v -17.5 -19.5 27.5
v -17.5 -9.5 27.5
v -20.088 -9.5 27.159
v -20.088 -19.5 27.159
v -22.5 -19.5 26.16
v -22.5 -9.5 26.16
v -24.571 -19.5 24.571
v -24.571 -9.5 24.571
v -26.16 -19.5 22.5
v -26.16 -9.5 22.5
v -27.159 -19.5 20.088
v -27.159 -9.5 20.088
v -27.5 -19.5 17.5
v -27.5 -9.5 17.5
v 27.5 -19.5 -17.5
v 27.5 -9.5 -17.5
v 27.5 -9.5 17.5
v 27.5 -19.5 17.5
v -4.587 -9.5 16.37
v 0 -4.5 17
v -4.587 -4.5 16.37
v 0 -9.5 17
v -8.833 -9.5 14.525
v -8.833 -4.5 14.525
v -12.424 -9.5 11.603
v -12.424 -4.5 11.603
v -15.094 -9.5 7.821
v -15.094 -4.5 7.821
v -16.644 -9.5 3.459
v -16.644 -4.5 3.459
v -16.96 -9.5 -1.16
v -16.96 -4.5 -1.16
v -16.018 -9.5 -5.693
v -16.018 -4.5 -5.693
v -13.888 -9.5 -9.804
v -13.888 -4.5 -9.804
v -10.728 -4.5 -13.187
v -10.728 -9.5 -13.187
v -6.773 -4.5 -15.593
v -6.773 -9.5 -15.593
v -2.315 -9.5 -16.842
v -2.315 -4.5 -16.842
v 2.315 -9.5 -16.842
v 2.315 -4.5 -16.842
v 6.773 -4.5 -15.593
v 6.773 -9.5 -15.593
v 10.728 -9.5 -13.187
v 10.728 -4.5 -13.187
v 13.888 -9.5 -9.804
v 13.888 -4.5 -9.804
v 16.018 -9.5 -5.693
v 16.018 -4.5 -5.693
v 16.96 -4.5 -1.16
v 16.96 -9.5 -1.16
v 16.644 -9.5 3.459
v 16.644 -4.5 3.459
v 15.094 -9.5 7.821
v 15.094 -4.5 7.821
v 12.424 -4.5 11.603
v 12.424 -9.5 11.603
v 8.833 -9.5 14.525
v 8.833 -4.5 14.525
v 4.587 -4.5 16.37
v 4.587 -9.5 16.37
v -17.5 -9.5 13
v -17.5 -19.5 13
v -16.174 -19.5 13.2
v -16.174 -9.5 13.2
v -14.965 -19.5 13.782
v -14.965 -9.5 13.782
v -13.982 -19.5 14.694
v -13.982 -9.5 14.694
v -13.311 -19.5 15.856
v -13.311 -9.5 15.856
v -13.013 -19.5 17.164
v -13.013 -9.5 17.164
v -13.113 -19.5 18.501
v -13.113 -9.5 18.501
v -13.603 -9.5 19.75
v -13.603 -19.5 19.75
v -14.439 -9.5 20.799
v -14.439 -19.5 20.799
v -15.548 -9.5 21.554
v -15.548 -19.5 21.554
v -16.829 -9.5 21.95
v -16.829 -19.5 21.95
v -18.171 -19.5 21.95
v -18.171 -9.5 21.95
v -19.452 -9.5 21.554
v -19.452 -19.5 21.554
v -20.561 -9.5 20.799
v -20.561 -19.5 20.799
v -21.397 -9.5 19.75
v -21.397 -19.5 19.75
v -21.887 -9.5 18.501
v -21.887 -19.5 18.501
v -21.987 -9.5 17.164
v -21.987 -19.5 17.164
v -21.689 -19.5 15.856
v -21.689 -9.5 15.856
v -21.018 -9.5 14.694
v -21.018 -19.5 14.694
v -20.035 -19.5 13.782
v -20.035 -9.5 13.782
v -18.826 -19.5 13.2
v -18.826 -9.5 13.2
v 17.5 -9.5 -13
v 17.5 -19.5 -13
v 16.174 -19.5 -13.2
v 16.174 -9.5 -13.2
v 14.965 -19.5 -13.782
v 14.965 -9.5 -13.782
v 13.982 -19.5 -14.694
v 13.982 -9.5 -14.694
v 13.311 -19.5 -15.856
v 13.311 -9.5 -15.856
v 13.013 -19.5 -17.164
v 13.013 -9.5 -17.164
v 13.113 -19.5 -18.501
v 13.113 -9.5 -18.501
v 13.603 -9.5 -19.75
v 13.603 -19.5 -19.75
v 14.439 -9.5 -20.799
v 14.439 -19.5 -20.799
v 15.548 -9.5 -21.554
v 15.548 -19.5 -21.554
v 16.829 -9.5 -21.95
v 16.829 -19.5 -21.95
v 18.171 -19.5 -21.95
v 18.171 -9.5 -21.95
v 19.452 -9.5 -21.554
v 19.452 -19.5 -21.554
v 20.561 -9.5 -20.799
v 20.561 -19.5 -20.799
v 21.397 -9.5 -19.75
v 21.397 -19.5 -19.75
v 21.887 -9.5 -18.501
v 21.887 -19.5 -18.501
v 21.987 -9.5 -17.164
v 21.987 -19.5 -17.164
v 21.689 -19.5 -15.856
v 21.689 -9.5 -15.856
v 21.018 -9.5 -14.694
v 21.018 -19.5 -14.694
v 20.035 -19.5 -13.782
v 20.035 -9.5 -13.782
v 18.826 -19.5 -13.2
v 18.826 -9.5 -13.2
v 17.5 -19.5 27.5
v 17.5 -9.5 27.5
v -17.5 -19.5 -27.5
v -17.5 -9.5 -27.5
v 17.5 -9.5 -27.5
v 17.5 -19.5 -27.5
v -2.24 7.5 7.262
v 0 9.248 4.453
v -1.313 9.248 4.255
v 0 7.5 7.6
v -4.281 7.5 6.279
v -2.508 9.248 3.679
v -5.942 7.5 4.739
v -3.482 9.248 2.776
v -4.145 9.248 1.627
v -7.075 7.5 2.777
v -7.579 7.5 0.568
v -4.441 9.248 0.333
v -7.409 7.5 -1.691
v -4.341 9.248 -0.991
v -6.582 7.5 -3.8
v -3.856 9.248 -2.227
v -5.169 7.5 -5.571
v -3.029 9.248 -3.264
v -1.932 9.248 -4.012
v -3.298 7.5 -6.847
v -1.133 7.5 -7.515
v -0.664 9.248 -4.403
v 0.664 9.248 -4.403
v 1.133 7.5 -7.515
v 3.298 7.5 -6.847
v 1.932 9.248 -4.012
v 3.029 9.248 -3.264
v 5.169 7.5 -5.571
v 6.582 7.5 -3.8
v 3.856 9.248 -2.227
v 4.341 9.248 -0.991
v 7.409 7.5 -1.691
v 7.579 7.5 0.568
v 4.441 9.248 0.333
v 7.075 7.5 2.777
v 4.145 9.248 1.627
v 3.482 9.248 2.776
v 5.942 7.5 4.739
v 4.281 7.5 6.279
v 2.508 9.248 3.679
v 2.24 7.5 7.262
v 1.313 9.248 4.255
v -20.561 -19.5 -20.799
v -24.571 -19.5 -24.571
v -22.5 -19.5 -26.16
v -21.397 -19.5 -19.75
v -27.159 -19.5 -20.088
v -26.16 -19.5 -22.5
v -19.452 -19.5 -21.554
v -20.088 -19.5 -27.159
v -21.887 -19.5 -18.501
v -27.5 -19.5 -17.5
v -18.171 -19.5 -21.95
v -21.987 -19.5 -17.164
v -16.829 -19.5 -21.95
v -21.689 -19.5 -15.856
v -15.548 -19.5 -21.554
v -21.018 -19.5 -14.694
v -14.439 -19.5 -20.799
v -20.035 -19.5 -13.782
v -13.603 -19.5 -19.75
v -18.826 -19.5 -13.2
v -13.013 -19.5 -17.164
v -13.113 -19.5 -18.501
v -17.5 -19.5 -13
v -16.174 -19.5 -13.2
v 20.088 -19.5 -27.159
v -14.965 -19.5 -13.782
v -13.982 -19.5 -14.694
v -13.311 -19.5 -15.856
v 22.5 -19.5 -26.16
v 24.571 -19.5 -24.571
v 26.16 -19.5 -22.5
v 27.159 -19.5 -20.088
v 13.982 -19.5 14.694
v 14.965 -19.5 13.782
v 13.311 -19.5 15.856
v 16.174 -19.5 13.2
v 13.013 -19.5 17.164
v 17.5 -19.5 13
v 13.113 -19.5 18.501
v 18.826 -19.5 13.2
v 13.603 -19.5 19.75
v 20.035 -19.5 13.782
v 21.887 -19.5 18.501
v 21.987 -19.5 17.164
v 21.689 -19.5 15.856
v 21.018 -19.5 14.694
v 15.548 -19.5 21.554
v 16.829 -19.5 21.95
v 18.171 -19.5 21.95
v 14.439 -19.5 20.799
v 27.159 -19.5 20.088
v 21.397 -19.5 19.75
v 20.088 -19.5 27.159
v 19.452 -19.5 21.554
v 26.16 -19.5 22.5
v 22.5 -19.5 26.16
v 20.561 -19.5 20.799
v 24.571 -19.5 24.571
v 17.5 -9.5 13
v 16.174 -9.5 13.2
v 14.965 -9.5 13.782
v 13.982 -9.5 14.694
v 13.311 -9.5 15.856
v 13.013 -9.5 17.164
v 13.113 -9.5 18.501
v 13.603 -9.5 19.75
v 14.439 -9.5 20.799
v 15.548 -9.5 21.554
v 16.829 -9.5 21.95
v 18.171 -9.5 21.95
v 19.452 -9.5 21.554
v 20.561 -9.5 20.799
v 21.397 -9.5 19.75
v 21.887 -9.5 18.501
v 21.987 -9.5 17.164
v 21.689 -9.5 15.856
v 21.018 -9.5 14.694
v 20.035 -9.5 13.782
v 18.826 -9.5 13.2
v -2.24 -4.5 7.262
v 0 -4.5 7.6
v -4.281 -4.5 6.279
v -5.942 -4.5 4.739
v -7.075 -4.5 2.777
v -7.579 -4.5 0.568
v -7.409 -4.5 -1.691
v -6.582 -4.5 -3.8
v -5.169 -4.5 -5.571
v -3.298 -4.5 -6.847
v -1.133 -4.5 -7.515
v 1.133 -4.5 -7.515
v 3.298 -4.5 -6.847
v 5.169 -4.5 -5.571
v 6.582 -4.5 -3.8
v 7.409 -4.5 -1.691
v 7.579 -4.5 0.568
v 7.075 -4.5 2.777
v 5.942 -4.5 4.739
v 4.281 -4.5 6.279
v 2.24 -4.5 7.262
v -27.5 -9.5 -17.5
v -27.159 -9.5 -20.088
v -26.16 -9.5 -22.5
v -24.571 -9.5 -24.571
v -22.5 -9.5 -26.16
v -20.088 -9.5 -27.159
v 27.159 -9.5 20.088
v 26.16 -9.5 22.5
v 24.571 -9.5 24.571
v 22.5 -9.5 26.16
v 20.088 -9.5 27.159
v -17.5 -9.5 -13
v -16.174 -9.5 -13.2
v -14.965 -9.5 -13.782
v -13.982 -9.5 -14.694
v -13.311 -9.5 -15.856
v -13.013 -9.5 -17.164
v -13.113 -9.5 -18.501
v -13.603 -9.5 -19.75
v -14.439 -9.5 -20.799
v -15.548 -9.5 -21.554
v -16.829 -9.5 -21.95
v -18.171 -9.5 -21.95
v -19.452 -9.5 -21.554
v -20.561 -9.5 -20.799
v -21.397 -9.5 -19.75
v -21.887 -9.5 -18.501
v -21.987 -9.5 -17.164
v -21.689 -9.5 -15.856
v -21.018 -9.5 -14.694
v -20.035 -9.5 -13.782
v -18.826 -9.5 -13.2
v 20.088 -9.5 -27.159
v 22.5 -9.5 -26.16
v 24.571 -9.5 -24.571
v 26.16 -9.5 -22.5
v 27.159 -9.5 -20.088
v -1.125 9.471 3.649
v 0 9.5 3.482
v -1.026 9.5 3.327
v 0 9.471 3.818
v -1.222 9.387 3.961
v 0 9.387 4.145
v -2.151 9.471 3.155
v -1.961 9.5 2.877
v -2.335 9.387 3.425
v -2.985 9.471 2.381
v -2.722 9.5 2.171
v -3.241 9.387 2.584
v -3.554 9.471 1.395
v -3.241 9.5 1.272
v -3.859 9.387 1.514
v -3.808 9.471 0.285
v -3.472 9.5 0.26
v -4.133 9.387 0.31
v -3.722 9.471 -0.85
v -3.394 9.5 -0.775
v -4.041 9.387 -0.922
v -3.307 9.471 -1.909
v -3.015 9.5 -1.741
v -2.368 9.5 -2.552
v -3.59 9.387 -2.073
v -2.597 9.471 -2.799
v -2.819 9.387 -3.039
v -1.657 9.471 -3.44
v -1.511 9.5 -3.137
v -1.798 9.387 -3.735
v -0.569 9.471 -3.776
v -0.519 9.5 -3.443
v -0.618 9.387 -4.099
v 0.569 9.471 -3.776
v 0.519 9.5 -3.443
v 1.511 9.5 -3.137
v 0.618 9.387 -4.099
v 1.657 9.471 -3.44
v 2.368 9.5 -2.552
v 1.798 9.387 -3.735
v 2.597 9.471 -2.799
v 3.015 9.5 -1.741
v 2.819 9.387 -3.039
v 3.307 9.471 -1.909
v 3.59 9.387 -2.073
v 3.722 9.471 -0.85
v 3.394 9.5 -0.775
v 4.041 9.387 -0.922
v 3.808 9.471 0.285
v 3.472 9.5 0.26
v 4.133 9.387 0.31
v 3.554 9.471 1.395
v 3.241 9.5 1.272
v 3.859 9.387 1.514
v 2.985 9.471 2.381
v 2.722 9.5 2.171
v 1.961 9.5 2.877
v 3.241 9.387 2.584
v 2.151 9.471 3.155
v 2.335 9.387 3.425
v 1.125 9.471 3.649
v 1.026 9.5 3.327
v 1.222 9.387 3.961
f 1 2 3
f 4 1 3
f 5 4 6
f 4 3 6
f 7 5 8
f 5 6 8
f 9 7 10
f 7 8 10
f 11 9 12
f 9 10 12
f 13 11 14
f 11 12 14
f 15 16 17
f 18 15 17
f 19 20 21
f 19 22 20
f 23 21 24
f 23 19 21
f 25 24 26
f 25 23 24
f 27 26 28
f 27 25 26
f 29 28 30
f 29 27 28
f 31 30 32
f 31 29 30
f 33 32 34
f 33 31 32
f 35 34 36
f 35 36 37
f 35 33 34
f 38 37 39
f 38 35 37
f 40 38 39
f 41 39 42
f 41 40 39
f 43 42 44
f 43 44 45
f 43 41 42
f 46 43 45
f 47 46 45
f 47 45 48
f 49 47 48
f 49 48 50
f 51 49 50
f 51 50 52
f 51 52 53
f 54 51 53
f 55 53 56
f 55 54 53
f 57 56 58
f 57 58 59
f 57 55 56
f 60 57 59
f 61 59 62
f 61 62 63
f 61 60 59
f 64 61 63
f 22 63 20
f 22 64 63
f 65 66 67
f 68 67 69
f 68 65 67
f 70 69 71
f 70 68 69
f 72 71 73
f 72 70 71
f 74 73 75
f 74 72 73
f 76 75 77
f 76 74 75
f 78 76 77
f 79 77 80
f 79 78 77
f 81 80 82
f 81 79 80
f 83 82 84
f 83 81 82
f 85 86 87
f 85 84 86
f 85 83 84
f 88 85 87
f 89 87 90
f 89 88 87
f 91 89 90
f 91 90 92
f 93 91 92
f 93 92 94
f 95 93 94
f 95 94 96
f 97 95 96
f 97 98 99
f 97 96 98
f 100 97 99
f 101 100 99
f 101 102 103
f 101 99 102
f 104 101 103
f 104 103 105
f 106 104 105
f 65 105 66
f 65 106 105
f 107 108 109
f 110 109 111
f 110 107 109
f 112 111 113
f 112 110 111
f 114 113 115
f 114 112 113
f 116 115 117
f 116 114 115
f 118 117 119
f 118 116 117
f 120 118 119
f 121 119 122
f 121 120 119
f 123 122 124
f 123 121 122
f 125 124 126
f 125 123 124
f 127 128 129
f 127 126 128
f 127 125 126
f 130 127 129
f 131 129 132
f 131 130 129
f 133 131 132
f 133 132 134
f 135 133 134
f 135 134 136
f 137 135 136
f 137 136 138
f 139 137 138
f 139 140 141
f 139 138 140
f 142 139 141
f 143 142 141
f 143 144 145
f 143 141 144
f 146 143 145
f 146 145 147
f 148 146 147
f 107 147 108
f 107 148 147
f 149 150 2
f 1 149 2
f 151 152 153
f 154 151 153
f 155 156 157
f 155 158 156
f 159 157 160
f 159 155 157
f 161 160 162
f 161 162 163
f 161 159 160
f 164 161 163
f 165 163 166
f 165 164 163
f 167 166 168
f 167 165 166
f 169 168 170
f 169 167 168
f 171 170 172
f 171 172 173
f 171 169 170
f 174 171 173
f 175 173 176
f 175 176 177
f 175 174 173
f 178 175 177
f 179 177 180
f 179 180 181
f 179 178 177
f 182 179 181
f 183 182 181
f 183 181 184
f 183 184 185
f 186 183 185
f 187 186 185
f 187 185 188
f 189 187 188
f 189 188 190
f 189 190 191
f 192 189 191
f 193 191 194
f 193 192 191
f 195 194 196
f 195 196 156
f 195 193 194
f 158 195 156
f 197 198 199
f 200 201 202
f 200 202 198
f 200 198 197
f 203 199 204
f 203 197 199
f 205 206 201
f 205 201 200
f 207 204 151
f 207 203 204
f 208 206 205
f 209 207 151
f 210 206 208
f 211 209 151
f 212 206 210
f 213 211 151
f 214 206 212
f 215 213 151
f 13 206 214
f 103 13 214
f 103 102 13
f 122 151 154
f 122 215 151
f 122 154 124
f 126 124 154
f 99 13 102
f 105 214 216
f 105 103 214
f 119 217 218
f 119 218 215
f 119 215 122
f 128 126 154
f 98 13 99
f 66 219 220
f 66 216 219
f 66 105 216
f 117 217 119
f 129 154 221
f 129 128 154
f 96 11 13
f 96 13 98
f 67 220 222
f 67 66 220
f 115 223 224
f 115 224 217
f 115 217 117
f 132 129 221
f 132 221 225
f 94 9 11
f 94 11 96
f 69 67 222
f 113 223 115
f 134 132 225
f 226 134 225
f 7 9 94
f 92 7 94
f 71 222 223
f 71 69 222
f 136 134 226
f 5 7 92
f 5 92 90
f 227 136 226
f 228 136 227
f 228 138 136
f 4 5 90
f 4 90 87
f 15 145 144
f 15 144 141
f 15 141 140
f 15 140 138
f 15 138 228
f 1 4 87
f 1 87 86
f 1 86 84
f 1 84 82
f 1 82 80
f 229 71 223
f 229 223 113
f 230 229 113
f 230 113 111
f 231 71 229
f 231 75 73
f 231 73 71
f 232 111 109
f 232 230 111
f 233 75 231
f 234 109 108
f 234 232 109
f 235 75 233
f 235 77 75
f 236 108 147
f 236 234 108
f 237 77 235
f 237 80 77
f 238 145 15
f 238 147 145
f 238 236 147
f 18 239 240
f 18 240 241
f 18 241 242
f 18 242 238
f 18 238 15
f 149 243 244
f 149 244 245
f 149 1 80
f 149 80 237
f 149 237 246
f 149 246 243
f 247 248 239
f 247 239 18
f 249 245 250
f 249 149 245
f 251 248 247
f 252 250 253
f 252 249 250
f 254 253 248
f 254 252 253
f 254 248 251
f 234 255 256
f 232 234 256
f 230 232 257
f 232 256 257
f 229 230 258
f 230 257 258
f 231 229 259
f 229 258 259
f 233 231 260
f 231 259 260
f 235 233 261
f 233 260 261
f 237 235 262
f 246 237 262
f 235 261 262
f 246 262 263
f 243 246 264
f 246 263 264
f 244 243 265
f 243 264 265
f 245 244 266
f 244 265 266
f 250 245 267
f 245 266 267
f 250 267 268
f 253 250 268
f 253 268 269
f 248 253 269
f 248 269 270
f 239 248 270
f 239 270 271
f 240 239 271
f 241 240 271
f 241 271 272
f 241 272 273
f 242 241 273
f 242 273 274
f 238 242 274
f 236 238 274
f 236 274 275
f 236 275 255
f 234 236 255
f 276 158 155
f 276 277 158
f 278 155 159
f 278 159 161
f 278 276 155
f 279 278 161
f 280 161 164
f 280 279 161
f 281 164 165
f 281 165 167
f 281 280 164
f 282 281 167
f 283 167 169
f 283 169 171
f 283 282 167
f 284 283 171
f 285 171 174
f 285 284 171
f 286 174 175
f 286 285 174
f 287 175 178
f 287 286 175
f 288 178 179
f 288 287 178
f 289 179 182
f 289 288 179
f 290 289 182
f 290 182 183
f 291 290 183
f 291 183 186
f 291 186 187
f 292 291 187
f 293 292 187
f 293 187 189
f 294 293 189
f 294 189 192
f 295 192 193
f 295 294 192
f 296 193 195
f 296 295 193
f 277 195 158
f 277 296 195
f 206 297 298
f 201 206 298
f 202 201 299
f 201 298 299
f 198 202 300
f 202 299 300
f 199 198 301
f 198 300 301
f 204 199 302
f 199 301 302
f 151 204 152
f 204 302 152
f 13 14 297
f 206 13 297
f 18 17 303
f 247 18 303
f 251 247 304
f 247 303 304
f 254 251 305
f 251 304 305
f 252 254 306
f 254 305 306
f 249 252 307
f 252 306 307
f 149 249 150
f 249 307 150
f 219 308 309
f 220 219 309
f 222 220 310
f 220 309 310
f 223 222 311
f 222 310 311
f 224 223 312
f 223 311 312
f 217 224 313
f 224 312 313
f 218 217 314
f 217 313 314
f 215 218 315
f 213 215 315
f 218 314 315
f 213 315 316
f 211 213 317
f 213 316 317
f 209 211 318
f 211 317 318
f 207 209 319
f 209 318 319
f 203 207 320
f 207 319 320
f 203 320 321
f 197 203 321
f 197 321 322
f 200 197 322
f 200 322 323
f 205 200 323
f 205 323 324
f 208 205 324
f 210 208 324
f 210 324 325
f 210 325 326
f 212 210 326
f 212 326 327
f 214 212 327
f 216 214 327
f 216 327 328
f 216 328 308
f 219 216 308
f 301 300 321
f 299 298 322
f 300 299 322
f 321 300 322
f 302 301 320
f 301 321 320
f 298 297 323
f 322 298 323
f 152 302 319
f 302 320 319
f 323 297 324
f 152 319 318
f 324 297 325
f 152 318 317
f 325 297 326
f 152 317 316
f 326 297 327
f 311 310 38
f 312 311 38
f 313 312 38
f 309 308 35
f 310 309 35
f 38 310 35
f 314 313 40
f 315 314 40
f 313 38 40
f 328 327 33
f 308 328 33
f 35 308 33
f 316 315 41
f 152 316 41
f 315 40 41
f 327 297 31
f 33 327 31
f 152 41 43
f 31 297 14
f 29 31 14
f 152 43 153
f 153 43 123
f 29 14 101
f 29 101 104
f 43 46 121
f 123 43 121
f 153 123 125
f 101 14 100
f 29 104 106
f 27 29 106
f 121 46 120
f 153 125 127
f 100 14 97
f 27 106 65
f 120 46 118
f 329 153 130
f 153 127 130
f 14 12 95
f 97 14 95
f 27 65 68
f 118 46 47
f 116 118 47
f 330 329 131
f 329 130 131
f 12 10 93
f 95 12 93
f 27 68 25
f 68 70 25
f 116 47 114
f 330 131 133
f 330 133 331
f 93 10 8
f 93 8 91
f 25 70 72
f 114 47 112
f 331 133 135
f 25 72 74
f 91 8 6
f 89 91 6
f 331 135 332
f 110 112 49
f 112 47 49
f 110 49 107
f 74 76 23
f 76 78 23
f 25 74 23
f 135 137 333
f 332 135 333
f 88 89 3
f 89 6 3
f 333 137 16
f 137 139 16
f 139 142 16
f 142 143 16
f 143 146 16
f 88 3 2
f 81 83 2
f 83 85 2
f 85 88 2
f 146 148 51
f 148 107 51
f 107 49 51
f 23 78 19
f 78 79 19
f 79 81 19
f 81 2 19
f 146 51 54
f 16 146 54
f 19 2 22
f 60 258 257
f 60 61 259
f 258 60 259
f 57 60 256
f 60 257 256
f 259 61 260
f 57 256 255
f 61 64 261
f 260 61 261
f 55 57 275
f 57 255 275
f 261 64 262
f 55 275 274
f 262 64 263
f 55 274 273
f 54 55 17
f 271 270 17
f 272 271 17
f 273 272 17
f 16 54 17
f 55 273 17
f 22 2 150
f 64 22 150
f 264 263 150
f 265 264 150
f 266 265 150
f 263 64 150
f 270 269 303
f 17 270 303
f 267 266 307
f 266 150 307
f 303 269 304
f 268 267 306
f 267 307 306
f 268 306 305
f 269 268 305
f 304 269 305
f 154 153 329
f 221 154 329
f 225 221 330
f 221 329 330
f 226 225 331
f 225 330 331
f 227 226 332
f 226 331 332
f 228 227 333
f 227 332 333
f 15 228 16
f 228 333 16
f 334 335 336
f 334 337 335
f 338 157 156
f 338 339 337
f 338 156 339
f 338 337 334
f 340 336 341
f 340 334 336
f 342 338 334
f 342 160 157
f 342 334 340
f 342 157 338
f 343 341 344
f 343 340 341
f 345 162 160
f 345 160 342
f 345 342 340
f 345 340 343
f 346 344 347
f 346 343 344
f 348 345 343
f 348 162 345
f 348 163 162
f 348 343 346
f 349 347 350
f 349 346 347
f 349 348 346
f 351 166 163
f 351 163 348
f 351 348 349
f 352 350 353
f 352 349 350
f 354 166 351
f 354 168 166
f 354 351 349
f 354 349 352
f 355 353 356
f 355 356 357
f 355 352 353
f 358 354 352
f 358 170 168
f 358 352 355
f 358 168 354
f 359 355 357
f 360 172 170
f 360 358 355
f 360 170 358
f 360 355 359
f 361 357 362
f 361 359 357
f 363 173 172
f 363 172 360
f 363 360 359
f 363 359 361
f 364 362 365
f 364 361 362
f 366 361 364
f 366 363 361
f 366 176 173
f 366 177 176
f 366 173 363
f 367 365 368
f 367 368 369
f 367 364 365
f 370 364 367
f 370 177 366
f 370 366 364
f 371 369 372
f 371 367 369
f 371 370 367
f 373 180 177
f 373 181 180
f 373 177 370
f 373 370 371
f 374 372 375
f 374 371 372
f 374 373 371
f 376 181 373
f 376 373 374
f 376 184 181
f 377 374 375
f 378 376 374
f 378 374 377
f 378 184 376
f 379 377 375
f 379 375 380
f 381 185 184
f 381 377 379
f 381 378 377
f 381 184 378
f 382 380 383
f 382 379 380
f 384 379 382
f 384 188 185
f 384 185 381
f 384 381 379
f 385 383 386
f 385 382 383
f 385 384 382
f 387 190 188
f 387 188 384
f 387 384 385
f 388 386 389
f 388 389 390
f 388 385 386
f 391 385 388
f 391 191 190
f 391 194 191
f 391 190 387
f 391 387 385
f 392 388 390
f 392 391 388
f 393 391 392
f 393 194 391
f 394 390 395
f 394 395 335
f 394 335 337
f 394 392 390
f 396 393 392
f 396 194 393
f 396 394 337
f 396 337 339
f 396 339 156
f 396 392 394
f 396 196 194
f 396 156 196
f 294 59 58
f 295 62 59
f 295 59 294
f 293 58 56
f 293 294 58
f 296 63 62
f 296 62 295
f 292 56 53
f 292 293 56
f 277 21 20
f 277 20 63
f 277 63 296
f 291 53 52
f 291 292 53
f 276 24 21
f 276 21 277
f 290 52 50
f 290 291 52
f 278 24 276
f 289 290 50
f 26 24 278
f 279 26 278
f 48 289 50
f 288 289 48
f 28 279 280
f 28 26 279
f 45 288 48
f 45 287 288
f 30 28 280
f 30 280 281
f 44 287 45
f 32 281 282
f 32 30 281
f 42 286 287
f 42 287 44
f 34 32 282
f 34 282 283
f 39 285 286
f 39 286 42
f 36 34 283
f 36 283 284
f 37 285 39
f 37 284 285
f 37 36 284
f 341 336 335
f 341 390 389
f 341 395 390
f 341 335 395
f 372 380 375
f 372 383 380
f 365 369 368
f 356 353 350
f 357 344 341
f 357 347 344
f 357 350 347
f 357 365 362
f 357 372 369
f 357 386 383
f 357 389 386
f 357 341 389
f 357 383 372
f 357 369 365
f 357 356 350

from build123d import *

# Parameters (mm, degrees)
BOSS_EXTRUDE1_DEPTH                        = 10
SKETCH3_R                                  = 4.5
CUT_EXTRUDE1_DEPTH                         = 44.28394626
MIRROR1_AT_THE_SECOND_PLANE_COPY_1_SKETC_R = 4.5
MIRROR1_AT_THE_SECOND_PLANE_COPY_1_DEPTH   = 44.28394626


with BuildPart() as part:
    # Sketch1 → Revolve1 (revolve)
    with BuildSketch(Plane.XY, mode=Mode.PRIVATE) as revolve1_sk:
        with BuildLine():
            Line((0, 9.5), (3.481747944, 9.5))
            ThreePointArc((3.481747944, 9.5), (3.98343056, 9.436056443), (4.453033806, 9.248314552))
            Line((4.453033806, 9.248314552), (7.6, 7.5))
            Line((7.6, 7.5), (7.6, -4.5))
            Line((7.6, -4.5), (17, -4.5))
            Line((17, -4.5), (17, -9.5))
            Line((17, -9.5), (7.6, -9.5))
            Line((7.6, -9.5), (0, -9.5))
            Line((0, -9.5), (0, 9.5))
        make_face()
    revolve(revolve1_sk.sketch.rotate(Axis((0, 9.5, 0), (0, -1, 0)), 90), axis=Axis((0, 9.5, 0), (0, -1, 0)))

    # Sketch2 → Boss-Extrude1 (add)
    with BuildSketch(Plane.XZ.offset(9.5)):
        with BuildLine():
            Line((17.5, 27.5), (-17.5, 27.5))
            ThreePointArc((-17.5, 27.5), (-24.571067812, 24.571067812), (-27.5, 17.5))
            Line((-27.5, 17.5), (-27.5, -17.5))
            ThreePointArc((-27.5, -17.5), (-24.571067812, -24.571067812), (-17.5, -27.5))
            Line((-17.5, -27.5), (17.5, -27.5))
            ThreePointArc((17.5, -27.5), (24.571067812, -24.571067812), (27.5, -17.5))
            Line((27.5, -17.5), (27.5, 17.5))
            ThreePointArc((27.5, 17.5), (24.571067812, 24.571067812), (17.5, 27.5))
        make_face()
    extrude(amount=BOSS_EXTRUDE1_DEPTH)

    # Sketch3 → Cut-Extrude1 (cut, through all)
    with BuildSketch(Plane(origin=(0, -9.5, 0), x_dir=(1, 0, 0), z_dir=(0, 1, 0))):
        with Locations(Location((-17.5, 17.5, 0), (0, 0, 270))):
            Circle(SKETCH3_R)
    cut_extrude1 = extrude(amount=-CUT_EXTRUDE1_DEPTH, mode=Mode.SUBTRACT)

    # Mirror1: Cut-Extrude1 across plane
    add(cut_extrude1.mirror(Plane.XY), mode=Mode.SUBTRACT)

    # Mirror1 at the second plane: Cut-Extrude1 across plane
    add(cut_extrude1.mirror(Plane(origin=(0, 0, 0), x_dir=(0, 0, 1), z_dir=(1, 0, 0))), mode=Mode.SUBTRACT)

    # Mirror1 at the second plane copy 1 sketc → Mirror1 at the second plane copy 1 (cut, through all)
    with BuildSketch(Plane(origin=(0, -9.5, 0), x_dir=(-1, 0, 0), z_dir=(0, 1, 0))):
        with Locations(Location((-17.5, 17.5, 0), (0, 0, 270))):
            Circle(MIRROR1_AT_THE_SECOND_PLANE_COPY_1_SKETC_R)
    extrude(amount=-MIRROR1_AT_THE_SECOND_PLANE_COPY_1_DEPTH, mode=Mode.SUBTRACT)


solid = part.part
